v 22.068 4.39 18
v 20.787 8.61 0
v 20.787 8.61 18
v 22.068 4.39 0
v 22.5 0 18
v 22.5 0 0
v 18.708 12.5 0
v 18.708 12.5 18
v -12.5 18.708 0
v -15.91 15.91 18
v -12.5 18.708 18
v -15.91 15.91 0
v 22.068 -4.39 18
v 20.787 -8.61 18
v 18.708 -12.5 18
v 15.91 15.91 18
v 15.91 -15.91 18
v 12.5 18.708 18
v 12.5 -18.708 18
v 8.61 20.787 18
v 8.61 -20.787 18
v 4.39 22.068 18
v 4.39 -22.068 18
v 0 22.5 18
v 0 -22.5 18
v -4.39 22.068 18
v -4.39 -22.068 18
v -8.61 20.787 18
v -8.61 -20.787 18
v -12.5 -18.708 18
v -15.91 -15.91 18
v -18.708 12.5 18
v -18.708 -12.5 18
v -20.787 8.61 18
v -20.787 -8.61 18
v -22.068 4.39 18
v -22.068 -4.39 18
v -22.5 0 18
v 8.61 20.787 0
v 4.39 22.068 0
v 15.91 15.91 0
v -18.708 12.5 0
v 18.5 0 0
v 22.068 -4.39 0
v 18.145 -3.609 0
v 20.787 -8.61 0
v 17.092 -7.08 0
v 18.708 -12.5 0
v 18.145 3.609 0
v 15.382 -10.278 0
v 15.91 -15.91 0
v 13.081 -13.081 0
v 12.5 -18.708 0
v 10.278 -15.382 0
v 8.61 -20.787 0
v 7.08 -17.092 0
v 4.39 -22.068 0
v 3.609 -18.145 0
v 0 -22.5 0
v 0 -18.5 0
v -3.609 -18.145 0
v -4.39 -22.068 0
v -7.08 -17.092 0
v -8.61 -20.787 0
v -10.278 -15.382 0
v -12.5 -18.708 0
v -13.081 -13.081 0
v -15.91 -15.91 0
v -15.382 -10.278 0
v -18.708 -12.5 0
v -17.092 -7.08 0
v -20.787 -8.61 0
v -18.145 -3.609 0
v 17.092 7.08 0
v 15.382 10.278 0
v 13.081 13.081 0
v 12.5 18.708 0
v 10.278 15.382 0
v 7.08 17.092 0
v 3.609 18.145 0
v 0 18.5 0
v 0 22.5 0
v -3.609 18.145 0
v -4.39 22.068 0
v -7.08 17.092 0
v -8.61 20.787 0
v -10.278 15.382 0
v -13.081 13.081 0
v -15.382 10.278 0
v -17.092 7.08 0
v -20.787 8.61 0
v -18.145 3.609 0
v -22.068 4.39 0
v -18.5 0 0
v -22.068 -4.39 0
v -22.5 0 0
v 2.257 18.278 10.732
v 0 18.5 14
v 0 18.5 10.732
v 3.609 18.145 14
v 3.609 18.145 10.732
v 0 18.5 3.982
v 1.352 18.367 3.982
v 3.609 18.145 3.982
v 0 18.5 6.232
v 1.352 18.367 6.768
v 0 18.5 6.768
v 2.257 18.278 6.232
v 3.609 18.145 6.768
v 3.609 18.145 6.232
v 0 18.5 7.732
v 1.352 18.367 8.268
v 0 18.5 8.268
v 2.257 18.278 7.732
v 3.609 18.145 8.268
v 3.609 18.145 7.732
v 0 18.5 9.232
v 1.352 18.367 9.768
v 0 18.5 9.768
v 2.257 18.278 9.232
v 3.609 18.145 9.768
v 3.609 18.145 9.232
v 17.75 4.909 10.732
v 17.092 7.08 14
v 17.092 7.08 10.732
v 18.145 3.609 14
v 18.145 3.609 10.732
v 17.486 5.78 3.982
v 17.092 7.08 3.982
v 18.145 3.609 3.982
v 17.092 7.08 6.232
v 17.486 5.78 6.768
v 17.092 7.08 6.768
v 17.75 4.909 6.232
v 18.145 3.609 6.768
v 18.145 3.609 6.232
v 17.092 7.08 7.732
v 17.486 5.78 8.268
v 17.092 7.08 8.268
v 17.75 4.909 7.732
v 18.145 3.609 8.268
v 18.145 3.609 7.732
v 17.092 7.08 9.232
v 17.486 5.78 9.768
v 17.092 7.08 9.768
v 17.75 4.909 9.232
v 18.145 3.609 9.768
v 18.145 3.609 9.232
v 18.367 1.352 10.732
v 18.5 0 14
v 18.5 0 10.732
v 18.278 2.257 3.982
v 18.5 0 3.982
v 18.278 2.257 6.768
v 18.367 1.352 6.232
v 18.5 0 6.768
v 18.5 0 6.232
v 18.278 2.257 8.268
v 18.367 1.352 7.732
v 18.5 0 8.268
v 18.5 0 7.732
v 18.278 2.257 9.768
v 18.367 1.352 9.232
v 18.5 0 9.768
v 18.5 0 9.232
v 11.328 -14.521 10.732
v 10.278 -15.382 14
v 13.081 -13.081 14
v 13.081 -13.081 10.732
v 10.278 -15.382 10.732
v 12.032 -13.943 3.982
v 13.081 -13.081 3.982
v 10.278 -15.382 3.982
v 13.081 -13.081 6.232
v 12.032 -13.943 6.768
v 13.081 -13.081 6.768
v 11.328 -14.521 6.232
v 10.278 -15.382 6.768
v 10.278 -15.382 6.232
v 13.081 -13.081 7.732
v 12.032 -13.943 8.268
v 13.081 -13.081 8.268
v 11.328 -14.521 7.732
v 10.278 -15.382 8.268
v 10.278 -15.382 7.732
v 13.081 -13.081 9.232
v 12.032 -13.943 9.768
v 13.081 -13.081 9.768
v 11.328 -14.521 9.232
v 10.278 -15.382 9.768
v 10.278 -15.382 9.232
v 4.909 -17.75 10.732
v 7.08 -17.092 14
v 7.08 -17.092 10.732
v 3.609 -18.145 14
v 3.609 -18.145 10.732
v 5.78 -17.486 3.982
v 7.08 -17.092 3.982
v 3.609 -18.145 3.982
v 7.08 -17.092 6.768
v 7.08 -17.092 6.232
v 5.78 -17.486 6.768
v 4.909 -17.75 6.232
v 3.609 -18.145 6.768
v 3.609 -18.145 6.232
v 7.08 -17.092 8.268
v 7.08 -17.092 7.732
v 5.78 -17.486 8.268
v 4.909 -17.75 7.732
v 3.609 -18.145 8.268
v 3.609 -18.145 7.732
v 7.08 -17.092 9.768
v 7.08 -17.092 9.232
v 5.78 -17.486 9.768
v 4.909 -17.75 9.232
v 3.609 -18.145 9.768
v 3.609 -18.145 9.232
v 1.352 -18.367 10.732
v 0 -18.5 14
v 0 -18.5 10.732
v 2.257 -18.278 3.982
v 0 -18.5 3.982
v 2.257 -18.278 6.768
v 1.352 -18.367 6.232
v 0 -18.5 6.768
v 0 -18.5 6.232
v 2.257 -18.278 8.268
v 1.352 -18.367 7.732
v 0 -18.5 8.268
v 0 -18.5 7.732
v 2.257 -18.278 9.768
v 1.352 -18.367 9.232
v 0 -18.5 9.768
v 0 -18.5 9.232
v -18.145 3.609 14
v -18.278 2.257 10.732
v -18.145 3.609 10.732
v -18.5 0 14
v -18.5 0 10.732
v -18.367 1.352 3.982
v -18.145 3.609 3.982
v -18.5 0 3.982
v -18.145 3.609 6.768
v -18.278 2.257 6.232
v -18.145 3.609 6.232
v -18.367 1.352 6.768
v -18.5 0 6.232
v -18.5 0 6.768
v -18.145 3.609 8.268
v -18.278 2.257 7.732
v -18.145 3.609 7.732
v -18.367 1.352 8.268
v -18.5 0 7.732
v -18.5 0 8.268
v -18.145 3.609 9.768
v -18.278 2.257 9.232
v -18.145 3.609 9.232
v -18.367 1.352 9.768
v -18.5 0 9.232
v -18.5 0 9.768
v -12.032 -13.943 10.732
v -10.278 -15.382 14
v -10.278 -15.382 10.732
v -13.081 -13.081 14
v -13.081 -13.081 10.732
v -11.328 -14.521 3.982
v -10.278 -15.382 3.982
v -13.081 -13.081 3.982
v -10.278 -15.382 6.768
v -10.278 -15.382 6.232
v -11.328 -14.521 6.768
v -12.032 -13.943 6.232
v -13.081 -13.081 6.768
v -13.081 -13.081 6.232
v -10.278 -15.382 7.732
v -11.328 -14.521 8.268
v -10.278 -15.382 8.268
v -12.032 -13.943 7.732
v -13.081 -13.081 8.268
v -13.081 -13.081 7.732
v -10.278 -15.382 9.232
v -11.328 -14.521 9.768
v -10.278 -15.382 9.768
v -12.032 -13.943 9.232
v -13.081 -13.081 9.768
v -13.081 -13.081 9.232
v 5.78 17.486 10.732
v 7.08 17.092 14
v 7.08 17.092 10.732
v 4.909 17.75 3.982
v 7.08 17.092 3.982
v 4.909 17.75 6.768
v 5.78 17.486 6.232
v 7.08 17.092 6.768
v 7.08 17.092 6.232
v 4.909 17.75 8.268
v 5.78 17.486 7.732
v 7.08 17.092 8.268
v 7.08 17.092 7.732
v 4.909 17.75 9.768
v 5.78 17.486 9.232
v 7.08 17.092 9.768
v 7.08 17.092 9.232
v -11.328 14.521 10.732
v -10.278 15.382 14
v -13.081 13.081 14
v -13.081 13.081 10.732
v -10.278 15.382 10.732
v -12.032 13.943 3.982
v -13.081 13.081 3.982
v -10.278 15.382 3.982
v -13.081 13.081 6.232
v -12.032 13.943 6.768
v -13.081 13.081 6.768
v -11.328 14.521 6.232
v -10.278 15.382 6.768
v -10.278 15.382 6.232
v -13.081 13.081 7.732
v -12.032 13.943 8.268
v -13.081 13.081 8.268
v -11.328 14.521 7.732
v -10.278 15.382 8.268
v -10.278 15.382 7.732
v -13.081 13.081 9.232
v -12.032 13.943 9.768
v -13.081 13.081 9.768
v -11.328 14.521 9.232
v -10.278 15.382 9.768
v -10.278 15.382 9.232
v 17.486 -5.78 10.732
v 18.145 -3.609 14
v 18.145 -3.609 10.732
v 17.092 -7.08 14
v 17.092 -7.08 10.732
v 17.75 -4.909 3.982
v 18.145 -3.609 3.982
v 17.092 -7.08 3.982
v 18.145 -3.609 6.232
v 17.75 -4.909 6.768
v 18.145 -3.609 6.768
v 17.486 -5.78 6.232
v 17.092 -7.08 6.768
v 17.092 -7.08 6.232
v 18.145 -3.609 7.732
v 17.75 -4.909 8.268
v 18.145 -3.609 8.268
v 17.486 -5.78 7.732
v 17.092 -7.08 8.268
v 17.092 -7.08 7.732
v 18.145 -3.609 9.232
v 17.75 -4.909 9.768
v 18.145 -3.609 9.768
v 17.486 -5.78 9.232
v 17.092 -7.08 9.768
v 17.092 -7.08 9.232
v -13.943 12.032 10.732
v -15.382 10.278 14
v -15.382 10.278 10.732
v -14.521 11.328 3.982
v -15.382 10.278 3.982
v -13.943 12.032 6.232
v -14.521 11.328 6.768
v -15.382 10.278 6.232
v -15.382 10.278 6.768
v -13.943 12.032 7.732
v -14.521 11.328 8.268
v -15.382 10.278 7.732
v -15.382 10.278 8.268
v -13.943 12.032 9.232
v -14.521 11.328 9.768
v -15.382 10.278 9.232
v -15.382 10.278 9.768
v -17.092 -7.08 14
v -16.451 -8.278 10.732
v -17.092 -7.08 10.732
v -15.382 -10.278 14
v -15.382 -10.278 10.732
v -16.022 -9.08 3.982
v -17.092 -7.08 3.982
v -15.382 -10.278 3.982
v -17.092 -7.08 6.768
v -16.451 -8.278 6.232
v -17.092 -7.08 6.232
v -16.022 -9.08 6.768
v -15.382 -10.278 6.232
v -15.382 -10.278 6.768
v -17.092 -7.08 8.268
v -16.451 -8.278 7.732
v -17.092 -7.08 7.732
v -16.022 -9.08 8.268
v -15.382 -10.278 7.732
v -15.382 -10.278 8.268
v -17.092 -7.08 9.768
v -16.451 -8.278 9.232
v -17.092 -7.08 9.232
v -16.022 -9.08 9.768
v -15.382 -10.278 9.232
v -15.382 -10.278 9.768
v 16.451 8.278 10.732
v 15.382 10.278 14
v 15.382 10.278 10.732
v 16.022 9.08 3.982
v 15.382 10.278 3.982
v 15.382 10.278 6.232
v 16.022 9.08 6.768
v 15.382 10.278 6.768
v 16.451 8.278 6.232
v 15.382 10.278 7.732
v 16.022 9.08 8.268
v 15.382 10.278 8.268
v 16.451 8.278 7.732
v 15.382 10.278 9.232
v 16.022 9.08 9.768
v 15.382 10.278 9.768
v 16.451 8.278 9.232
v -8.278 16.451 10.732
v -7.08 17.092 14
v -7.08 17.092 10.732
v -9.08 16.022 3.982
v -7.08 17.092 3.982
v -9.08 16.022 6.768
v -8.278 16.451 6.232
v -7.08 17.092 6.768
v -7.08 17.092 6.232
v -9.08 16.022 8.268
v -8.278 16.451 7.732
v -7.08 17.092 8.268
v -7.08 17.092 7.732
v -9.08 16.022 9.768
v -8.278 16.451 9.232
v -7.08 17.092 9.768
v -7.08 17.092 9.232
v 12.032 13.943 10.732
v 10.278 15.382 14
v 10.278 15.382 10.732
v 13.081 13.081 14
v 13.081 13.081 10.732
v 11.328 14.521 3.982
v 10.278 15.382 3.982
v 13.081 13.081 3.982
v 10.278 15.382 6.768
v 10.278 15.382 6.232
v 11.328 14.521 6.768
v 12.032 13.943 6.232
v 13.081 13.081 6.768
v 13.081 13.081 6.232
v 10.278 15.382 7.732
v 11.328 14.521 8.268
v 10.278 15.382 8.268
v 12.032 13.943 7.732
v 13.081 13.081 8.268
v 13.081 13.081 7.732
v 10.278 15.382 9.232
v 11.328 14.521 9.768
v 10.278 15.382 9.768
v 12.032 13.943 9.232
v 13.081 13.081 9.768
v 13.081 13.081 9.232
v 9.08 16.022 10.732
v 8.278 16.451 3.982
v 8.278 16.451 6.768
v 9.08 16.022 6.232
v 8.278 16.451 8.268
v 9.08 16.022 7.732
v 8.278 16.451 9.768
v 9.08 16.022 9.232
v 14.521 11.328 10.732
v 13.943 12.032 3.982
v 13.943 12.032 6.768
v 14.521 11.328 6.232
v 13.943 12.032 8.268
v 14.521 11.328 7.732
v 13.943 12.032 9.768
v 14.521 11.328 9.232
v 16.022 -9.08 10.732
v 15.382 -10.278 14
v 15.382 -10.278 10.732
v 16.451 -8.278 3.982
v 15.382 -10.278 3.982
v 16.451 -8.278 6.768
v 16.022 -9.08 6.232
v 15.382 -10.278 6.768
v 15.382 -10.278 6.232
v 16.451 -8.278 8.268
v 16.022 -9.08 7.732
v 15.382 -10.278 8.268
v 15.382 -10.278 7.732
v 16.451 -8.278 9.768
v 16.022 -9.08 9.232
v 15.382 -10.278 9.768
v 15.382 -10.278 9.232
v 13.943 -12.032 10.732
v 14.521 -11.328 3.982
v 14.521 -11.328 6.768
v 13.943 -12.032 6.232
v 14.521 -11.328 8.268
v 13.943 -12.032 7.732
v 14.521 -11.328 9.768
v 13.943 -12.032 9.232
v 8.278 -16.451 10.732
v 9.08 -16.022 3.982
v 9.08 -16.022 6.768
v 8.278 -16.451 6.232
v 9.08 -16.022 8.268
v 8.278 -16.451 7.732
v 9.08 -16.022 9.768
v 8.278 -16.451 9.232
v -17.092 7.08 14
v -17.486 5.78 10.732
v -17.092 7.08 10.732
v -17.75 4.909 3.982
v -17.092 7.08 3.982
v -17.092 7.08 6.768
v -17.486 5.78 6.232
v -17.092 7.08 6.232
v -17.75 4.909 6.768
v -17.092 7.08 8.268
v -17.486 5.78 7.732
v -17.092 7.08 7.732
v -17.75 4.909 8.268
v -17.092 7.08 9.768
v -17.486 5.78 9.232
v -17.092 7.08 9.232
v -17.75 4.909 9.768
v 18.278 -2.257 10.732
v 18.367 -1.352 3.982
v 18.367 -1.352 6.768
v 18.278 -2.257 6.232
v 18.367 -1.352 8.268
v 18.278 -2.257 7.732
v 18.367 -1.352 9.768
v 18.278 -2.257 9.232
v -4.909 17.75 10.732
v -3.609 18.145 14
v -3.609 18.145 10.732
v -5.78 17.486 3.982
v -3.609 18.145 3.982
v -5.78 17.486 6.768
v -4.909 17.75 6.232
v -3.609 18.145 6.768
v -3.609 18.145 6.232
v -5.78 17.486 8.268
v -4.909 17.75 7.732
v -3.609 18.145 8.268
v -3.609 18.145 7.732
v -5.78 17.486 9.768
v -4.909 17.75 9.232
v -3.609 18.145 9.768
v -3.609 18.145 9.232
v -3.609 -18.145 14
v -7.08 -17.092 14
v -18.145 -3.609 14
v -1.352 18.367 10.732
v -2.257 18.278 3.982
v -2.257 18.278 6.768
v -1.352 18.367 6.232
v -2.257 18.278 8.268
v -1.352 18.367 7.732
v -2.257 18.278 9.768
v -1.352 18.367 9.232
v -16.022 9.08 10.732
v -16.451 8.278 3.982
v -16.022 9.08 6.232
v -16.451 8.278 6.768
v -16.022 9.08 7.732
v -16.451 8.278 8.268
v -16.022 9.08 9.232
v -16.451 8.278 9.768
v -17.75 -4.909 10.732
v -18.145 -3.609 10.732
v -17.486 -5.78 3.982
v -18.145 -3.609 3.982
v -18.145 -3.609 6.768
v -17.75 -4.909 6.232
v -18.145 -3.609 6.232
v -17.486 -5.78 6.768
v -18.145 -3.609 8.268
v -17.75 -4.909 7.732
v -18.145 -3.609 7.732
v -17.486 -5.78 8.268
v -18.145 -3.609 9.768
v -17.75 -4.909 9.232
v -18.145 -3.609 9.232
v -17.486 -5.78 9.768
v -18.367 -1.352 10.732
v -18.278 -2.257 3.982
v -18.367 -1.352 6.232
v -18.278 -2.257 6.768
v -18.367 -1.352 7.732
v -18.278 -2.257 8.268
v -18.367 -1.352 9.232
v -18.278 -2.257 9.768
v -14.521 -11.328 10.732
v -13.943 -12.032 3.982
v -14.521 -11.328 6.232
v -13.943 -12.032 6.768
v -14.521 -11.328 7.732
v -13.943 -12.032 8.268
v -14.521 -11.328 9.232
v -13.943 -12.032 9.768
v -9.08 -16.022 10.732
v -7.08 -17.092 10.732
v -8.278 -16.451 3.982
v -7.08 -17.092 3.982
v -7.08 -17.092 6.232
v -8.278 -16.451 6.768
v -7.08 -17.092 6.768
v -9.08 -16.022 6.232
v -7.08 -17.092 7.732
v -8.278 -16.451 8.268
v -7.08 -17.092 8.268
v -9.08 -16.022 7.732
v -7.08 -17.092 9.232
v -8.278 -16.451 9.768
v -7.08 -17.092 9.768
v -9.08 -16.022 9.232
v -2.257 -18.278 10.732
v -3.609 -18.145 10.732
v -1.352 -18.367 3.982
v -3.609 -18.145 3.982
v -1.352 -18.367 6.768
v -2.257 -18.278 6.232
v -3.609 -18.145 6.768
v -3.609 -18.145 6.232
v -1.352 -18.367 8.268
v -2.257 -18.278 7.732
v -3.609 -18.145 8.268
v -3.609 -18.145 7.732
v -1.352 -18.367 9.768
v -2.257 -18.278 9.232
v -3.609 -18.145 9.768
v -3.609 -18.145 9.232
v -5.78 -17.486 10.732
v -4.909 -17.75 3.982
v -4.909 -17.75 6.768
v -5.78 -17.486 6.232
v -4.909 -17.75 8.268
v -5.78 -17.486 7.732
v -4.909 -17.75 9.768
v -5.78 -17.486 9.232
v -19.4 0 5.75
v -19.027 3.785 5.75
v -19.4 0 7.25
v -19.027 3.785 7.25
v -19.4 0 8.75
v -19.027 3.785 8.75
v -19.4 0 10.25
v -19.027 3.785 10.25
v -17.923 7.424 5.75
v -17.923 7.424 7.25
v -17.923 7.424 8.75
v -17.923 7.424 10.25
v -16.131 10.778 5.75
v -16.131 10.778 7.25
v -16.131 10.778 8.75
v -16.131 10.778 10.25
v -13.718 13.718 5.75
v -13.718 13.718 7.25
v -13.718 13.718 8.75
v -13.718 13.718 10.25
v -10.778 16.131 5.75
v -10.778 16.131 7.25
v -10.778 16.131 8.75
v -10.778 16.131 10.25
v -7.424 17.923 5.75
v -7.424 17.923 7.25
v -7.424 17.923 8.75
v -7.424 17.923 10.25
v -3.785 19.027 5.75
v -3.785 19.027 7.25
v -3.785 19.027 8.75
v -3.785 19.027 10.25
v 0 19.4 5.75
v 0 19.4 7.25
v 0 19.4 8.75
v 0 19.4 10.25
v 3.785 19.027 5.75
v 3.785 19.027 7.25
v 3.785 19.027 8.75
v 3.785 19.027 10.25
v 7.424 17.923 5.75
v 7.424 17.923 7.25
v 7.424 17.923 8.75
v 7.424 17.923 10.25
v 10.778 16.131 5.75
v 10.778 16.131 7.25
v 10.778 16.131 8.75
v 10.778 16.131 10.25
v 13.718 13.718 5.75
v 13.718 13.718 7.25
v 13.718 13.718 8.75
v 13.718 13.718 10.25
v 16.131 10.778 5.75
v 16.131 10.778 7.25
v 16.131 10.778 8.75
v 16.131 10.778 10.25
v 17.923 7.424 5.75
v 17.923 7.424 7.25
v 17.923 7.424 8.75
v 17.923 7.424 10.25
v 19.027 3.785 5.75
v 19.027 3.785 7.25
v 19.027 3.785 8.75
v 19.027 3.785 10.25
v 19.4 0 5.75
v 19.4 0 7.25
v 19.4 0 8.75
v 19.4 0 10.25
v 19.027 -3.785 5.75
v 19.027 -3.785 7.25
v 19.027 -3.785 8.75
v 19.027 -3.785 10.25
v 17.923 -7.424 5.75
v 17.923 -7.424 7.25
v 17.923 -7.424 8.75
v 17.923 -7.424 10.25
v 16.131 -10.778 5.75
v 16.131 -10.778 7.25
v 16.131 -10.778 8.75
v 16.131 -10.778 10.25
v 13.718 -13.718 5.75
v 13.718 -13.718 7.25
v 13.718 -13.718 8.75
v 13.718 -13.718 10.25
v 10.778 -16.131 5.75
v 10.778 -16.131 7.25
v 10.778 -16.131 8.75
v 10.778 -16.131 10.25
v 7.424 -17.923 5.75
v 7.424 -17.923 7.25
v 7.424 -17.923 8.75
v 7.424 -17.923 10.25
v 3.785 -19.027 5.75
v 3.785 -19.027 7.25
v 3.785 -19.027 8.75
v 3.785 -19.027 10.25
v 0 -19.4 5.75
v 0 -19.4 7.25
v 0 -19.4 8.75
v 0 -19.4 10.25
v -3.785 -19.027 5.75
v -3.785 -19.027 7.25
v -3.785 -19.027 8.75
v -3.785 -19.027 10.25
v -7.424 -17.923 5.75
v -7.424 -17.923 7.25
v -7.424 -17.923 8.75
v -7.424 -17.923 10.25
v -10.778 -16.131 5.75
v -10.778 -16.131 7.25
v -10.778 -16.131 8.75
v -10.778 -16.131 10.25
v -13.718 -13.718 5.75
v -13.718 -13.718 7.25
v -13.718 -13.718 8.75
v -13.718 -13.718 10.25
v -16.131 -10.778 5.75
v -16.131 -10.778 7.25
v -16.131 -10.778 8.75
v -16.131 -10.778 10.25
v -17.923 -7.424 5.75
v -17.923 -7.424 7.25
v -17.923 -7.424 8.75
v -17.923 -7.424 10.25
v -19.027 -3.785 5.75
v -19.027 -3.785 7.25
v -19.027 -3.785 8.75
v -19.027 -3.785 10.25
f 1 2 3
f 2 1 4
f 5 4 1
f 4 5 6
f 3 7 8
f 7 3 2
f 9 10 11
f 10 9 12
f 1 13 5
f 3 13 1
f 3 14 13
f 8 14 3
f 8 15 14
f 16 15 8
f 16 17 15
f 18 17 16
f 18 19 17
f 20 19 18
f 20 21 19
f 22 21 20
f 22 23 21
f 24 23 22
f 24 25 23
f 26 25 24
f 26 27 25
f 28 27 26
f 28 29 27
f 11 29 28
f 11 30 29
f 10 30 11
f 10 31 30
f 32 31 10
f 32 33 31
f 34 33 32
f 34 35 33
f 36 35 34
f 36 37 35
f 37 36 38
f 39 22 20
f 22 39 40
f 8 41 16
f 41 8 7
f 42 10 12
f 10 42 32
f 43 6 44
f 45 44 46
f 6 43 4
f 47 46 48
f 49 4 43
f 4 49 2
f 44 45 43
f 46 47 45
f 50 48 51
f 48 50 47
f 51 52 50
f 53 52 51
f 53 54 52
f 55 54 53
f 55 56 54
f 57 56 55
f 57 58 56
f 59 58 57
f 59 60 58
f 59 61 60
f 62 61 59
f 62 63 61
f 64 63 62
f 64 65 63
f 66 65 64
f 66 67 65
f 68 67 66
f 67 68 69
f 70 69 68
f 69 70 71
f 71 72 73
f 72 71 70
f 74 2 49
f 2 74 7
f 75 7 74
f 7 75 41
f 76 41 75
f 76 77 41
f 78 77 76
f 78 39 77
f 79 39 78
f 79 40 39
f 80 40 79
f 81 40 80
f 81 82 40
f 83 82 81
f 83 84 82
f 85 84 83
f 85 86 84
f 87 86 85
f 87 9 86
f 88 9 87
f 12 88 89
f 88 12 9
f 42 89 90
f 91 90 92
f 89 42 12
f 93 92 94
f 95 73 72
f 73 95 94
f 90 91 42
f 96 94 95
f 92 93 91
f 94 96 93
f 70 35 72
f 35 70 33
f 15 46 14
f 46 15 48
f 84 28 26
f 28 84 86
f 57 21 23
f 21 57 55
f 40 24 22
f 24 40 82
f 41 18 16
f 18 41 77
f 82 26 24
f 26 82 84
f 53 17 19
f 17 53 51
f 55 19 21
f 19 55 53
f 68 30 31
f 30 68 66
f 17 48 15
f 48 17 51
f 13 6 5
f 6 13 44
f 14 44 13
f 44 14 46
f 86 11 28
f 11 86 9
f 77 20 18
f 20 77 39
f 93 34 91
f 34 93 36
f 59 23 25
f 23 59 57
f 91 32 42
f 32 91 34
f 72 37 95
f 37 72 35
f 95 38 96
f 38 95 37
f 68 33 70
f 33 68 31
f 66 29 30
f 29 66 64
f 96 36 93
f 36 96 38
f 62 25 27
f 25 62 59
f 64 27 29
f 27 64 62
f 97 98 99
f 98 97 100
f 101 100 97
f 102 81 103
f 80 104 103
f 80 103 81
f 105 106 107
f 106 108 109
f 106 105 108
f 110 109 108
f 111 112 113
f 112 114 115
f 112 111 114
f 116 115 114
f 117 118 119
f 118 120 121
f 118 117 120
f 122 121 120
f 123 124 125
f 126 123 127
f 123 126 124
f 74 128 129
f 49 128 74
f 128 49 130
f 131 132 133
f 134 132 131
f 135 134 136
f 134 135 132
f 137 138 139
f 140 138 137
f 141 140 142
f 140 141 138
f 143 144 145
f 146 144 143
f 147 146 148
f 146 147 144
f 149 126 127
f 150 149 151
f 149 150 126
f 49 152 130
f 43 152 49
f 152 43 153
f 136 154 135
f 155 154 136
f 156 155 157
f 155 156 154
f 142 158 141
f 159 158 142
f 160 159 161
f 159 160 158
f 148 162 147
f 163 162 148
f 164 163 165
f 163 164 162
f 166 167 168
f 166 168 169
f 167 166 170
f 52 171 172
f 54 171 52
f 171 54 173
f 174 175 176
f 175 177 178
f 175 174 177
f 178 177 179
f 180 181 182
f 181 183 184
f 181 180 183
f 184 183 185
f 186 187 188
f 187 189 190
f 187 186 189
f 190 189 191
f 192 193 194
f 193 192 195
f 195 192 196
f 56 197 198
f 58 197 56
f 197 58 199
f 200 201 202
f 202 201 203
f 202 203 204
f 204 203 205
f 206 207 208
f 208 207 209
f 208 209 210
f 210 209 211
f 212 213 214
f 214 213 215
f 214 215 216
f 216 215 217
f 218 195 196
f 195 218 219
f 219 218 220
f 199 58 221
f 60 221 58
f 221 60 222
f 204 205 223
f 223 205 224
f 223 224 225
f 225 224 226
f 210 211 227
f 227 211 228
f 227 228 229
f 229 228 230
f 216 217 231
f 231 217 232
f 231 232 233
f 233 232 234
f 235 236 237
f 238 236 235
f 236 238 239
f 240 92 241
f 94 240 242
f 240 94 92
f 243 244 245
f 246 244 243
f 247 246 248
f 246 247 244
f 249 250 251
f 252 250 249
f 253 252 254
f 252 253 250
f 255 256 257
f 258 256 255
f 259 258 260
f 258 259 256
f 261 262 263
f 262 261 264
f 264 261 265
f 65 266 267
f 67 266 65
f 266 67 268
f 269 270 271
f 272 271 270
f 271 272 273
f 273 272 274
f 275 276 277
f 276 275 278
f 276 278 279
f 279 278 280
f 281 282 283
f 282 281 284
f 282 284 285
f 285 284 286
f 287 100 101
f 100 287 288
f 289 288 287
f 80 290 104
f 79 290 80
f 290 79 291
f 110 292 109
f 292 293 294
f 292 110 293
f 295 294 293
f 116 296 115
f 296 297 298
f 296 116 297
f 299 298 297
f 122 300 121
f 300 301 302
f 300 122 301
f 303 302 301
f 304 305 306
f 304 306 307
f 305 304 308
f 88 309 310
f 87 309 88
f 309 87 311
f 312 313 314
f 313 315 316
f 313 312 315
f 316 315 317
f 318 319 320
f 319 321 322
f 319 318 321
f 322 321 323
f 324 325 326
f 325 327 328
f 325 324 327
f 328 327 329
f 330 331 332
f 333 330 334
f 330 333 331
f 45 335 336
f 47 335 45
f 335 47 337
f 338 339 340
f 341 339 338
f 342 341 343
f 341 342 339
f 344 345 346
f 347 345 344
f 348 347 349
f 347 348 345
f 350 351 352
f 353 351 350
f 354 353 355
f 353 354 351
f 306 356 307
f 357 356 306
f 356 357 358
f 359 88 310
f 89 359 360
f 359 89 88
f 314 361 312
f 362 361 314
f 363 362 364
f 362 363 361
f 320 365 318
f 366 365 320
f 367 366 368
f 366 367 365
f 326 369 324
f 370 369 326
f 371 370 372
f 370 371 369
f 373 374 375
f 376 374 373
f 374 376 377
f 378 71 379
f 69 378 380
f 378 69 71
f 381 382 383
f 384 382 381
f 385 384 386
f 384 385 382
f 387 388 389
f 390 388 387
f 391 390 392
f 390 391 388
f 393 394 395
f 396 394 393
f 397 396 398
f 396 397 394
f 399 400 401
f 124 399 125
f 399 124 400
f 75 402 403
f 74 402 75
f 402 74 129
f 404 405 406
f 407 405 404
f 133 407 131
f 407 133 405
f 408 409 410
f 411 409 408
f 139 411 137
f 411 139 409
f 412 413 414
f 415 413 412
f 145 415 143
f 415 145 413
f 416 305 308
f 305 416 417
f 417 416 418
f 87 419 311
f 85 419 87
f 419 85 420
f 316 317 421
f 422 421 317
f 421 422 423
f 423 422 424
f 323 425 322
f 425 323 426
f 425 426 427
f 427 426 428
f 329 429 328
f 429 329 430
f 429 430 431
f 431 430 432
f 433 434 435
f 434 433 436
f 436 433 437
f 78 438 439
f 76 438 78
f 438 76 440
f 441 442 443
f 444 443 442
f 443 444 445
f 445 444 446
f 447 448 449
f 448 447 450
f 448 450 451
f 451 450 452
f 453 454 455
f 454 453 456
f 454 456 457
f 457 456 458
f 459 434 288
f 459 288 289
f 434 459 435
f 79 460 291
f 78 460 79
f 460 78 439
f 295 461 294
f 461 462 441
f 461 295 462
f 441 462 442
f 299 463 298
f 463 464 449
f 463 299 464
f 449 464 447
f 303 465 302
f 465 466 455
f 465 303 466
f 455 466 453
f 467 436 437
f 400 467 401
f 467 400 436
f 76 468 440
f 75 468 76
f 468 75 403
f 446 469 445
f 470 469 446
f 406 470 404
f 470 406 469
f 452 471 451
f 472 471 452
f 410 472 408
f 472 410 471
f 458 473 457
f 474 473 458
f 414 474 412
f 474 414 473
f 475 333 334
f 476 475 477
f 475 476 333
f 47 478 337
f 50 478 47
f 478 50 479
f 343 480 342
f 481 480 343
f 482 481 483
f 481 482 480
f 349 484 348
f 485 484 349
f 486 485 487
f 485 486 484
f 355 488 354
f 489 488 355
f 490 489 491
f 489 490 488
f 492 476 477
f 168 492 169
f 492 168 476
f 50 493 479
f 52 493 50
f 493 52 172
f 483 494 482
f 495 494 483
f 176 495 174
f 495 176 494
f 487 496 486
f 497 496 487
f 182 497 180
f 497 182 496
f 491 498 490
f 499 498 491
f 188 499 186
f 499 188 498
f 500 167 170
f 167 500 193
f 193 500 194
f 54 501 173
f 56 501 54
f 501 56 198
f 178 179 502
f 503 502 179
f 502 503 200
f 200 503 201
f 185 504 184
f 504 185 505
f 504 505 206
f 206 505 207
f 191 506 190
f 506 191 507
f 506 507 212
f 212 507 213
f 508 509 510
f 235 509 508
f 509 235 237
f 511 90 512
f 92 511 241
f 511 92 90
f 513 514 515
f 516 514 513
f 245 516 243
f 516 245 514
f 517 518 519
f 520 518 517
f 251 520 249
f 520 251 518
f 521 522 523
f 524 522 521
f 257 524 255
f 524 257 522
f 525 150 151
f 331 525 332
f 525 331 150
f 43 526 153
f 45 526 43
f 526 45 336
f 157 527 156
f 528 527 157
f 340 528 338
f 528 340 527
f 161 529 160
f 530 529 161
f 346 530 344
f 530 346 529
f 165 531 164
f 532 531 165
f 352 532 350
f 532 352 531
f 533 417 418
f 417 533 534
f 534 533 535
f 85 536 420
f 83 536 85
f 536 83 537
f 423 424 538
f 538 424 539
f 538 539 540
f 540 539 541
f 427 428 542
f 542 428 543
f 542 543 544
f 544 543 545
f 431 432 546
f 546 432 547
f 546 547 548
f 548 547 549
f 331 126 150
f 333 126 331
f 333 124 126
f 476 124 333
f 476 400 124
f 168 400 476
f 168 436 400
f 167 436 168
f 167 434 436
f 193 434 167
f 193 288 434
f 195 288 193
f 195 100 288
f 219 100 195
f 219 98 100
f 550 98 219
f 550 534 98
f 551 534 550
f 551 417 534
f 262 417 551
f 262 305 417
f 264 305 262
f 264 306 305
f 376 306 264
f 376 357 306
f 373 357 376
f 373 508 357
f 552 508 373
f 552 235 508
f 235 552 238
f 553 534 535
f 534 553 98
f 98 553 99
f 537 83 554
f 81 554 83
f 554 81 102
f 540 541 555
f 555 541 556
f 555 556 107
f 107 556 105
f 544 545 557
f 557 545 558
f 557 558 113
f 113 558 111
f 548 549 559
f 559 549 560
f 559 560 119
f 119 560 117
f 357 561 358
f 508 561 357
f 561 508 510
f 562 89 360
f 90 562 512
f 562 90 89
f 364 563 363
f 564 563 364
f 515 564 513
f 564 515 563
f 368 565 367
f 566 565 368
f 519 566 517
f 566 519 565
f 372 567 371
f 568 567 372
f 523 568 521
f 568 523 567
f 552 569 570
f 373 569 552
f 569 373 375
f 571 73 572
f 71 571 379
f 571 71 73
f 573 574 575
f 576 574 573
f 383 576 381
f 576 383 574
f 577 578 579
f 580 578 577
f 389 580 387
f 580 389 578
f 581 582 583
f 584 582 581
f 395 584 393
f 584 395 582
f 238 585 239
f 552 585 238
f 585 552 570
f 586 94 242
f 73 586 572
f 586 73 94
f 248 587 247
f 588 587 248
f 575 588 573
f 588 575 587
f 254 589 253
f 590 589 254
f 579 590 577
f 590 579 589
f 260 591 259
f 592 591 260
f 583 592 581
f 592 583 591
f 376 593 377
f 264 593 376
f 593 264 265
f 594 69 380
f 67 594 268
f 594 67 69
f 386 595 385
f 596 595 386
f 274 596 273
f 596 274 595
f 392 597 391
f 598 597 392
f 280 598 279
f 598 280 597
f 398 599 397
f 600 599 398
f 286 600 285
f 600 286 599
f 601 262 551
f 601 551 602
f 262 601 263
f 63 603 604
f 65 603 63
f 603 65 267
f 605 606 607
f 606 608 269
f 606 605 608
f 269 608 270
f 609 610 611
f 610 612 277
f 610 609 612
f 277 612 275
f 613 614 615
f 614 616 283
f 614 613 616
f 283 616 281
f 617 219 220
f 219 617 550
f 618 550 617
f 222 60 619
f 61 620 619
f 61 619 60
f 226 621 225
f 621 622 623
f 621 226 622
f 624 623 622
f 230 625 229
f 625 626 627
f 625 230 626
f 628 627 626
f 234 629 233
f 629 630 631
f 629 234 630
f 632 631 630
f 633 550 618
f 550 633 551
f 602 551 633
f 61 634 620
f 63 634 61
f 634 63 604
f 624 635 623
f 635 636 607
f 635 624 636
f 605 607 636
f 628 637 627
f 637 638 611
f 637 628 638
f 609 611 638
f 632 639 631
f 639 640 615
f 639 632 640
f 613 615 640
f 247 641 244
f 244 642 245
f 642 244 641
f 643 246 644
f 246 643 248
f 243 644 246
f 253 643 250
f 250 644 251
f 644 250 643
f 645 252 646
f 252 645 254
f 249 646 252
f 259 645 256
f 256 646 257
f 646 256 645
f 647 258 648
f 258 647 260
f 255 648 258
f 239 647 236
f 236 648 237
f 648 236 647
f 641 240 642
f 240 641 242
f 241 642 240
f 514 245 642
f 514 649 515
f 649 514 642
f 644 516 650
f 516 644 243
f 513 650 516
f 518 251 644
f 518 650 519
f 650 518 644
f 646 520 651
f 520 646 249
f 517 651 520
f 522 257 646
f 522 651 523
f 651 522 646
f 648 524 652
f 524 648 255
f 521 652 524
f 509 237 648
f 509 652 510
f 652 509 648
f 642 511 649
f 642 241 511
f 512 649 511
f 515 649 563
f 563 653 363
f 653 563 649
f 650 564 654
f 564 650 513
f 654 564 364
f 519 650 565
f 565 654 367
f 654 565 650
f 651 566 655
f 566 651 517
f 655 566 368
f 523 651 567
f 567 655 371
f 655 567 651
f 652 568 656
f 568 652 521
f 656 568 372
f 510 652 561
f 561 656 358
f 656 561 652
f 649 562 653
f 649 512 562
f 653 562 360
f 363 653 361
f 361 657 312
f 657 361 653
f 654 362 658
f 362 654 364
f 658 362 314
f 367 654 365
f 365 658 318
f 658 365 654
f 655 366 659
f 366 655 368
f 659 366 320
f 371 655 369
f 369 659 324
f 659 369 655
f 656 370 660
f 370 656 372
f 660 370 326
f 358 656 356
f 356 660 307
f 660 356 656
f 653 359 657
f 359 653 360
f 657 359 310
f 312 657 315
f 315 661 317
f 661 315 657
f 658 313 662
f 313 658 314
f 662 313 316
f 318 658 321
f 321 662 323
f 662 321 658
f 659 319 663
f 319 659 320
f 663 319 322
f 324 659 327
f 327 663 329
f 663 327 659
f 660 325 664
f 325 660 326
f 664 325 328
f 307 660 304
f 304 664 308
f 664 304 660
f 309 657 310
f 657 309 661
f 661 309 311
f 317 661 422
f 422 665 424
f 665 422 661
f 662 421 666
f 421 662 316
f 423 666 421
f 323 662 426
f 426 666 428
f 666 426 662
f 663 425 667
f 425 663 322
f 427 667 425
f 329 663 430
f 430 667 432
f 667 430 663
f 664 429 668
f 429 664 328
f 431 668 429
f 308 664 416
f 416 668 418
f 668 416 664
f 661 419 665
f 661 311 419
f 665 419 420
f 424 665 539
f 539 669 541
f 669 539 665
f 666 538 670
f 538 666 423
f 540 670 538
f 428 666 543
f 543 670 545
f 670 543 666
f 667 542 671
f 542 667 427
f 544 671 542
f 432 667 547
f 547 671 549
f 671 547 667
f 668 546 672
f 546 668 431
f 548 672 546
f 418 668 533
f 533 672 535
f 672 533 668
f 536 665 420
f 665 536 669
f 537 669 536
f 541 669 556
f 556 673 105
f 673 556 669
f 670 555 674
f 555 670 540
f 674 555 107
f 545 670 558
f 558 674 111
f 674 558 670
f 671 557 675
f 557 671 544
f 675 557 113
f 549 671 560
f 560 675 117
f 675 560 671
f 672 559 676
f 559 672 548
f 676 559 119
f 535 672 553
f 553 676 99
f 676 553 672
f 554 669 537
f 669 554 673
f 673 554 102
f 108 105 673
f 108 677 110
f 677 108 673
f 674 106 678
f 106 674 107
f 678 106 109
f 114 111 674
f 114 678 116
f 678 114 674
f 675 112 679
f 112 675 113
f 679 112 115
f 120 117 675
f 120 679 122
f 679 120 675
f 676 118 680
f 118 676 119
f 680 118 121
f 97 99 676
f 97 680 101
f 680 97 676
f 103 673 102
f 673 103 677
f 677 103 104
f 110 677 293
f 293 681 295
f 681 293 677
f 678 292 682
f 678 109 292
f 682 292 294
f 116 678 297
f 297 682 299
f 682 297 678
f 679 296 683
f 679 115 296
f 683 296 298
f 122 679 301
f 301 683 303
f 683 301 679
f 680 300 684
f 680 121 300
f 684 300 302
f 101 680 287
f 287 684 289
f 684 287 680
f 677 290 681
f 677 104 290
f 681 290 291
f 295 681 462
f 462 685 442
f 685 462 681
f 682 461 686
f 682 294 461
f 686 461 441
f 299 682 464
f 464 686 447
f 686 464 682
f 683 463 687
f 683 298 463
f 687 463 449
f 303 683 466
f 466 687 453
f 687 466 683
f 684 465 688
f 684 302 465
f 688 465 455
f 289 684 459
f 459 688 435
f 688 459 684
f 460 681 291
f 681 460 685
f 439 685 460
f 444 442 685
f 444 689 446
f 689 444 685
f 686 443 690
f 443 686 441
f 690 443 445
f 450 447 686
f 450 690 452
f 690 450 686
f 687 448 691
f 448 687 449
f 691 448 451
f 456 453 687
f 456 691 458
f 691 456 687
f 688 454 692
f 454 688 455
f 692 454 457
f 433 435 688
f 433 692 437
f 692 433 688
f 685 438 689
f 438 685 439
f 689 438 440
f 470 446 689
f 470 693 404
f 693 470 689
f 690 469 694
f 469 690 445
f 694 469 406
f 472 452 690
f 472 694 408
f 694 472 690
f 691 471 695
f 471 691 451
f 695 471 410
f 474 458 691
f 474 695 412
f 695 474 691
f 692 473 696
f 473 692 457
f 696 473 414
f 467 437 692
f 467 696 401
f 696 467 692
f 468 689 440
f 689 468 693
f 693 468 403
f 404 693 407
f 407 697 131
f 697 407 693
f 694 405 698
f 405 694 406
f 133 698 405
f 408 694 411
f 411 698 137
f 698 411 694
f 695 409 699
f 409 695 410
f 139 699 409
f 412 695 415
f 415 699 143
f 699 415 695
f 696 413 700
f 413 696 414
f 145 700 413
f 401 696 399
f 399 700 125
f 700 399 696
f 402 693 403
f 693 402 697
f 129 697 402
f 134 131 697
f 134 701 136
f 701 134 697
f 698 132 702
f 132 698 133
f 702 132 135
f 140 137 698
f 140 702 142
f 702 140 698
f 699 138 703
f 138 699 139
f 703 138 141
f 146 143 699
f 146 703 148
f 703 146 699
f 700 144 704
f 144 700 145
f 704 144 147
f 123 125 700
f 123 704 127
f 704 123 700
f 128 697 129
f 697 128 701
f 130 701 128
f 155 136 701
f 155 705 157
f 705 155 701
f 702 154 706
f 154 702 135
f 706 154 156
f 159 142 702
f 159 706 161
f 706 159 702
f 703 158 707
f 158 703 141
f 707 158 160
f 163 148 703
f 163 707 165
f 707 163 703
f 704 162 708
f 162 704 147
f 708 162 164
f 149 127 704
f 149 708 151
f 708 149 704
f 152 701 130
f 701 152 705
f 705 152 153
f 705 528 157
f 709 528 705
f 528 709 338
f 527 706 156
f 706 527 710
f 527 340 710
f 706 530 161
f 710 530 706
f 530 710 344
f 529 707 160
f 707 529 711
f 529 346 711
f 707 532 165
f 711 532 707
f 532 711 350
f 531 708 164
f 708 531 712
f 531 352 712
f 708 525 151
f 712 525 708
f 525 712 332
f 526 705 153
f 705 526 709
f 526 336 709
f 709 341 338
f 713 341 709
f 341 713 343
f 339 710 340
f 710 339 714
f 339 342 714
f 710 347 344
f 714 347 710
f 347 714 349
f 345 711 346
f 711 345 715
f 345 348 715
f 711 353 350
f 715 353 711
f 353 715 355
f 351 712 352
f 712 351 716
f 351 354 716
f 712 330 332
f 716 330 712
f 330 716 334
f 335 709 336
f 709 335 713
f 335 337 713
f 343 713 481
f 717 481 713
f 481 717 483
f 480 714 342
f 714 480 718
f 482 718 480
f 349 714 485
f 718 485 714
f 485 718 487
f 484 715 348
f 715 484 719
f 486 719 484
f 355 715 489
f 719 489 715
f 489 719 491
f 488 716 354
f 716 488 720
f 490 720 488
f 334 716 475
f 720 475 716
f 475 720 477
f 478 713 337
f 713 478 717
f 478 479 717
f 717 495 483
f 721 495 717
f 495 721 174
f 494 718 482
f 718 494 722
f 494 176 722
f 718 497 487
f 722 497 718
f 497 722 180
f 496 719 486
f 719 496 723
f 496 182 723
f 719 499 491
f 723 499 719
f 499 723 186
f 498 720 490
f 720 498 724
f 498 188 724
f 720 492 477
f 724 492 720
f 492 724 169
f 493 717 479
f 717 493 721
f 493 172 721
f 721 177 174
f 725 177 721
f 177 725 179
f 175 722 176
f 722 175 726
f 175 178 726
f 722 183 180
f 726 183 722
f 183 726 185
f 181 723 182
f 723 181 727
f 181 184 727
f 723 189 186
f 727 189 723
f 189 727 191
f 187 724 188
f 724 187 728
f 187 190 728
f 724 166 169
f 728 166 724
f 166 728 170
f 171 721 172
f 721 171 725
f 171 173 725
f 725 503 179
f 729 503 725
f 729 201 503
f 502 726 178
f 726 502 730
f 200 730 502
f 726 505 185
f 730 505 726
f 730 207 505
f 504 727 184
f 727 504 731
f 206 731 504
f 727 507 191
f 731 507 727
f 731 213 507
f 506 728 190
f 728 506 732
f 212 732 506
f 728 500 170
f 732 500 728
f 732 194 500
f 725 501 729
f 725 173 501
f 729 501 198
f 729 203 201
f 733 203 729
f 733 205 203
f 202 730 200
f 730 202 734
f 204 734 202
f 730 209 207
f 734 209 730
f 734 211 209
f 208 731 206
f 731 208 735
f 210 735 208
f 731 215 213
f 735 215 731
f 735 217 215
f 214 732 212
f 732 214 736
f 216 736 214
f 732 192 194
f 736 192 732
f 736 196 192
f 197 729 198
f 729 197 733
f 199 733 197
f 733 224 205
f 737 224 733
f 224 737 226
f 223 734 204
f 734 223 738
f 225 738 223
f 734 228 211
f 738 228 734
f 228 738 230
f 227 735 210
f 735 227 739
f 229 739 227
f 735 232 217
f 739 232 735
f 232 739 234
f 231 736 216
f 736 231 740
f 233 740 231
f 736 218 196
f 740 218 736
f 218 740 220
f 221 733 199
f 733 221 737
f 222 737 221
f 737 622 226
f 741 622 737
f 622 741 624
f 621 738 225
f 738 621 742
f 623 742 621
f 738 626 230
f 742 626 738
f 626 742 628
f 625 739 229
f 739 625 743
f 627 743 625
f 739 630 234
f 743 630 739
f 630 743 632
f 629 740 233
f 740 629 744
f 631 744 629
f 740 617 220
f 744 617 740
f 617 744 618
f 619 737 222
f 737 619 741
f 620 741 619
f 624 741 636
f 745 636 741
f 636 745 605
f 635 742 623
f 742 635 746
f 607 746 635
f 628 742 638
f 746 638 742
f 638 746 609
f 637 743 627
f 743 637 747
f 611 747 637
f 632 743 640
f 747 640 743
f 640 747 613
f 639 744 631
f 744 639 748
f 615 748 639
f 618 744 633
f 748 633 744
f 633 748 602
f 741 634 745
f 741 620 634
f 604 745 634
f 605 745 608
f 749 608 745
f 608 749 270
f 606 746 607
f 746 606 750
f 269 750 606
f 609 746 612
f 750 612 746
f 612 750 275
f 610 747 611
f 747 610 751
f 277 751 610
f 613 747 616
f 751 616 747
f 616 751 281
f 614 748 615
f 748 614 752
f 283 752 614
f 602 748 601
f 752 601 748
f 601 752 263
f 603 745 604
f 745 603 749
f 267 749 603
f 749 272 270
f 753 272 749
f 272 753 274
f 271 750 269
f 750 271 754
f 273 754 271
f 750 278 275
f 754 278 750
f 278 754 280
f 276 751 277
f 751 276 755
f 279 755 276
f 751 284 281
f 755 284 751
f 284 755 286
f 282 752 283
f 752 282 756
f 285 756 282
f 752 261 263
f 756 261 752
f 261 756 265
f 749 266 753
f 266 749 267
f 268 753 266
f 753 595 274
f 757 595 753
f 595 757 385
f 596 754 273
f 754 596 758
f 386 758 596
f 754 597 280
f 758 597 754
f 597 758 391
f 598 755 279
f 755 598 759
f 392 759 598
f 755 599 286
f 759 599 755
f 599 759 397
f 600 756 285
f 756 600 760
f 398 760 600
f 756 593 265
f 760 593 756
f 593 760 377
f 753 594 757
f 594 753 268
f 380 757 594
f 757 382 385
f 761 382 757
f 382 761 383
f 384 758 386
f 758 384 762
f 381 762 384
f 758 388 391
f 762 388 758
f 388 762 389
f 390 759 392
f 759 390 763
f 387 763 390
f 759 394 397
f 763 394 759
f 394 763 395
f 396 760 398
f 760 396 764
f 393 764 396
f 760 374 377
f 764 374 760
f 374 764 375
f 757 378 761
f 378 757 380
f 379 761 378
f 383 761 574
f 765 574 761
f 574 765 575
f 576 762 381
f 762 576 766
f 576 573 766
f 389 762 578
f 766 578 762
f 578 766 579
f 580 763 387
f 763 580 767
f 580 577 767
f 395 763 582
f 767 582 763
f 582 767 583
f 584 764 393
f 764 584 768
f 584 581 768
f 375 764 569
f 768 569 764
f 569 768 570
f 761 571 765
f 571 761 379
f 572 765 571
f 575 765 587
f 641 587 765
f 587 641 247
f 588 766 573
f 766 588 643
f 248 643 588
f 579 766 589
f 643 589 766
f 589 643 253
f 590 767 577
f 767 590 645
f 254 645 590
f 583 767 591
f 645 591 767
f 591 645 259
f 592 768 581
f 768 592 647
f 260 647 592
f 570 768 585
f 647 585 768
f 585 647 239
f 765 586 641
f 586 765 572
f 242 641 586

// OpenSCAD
$fn = 32;

// ----------------------------------------------------------------------
// Threaded cap: 45 mm body, 18 mm tall, 37 mm threaded bore
// ----------------------------------------------------------------------

// --- parameters (mm) ---
outer_d = 45;             // cap outside diameter
body_h = 18;              // cap height
top_t = 4;                // closed top thickness
bore_d = 37;              // bore core diameter
pitch = 1.5;              // thread pitch
thread_d = 0.9;           // thread depth
thread_z = 3;             // thread start above the rim
thread_h = 8;             // threaded height

difference() {
  union() {
    cylinder(h = 18, d = outer_d);
  }
  /* threaded bore, closed at the top */
  translate([0, 0, -2.5]) cylinder(h = 16.5, d = bore_d);
  translate([0, 0, 3]) rotate_extrude() polygon([[17.5, 0], [17.5, 8], [18, 8], [19.4, 7.25], [18, 6.5], [19.4, 5.75], [18, 5], [19.4, 4.25], [18, 3.5], [19.4, 2.75], [18, 0], [17.5, 0]]);
}
